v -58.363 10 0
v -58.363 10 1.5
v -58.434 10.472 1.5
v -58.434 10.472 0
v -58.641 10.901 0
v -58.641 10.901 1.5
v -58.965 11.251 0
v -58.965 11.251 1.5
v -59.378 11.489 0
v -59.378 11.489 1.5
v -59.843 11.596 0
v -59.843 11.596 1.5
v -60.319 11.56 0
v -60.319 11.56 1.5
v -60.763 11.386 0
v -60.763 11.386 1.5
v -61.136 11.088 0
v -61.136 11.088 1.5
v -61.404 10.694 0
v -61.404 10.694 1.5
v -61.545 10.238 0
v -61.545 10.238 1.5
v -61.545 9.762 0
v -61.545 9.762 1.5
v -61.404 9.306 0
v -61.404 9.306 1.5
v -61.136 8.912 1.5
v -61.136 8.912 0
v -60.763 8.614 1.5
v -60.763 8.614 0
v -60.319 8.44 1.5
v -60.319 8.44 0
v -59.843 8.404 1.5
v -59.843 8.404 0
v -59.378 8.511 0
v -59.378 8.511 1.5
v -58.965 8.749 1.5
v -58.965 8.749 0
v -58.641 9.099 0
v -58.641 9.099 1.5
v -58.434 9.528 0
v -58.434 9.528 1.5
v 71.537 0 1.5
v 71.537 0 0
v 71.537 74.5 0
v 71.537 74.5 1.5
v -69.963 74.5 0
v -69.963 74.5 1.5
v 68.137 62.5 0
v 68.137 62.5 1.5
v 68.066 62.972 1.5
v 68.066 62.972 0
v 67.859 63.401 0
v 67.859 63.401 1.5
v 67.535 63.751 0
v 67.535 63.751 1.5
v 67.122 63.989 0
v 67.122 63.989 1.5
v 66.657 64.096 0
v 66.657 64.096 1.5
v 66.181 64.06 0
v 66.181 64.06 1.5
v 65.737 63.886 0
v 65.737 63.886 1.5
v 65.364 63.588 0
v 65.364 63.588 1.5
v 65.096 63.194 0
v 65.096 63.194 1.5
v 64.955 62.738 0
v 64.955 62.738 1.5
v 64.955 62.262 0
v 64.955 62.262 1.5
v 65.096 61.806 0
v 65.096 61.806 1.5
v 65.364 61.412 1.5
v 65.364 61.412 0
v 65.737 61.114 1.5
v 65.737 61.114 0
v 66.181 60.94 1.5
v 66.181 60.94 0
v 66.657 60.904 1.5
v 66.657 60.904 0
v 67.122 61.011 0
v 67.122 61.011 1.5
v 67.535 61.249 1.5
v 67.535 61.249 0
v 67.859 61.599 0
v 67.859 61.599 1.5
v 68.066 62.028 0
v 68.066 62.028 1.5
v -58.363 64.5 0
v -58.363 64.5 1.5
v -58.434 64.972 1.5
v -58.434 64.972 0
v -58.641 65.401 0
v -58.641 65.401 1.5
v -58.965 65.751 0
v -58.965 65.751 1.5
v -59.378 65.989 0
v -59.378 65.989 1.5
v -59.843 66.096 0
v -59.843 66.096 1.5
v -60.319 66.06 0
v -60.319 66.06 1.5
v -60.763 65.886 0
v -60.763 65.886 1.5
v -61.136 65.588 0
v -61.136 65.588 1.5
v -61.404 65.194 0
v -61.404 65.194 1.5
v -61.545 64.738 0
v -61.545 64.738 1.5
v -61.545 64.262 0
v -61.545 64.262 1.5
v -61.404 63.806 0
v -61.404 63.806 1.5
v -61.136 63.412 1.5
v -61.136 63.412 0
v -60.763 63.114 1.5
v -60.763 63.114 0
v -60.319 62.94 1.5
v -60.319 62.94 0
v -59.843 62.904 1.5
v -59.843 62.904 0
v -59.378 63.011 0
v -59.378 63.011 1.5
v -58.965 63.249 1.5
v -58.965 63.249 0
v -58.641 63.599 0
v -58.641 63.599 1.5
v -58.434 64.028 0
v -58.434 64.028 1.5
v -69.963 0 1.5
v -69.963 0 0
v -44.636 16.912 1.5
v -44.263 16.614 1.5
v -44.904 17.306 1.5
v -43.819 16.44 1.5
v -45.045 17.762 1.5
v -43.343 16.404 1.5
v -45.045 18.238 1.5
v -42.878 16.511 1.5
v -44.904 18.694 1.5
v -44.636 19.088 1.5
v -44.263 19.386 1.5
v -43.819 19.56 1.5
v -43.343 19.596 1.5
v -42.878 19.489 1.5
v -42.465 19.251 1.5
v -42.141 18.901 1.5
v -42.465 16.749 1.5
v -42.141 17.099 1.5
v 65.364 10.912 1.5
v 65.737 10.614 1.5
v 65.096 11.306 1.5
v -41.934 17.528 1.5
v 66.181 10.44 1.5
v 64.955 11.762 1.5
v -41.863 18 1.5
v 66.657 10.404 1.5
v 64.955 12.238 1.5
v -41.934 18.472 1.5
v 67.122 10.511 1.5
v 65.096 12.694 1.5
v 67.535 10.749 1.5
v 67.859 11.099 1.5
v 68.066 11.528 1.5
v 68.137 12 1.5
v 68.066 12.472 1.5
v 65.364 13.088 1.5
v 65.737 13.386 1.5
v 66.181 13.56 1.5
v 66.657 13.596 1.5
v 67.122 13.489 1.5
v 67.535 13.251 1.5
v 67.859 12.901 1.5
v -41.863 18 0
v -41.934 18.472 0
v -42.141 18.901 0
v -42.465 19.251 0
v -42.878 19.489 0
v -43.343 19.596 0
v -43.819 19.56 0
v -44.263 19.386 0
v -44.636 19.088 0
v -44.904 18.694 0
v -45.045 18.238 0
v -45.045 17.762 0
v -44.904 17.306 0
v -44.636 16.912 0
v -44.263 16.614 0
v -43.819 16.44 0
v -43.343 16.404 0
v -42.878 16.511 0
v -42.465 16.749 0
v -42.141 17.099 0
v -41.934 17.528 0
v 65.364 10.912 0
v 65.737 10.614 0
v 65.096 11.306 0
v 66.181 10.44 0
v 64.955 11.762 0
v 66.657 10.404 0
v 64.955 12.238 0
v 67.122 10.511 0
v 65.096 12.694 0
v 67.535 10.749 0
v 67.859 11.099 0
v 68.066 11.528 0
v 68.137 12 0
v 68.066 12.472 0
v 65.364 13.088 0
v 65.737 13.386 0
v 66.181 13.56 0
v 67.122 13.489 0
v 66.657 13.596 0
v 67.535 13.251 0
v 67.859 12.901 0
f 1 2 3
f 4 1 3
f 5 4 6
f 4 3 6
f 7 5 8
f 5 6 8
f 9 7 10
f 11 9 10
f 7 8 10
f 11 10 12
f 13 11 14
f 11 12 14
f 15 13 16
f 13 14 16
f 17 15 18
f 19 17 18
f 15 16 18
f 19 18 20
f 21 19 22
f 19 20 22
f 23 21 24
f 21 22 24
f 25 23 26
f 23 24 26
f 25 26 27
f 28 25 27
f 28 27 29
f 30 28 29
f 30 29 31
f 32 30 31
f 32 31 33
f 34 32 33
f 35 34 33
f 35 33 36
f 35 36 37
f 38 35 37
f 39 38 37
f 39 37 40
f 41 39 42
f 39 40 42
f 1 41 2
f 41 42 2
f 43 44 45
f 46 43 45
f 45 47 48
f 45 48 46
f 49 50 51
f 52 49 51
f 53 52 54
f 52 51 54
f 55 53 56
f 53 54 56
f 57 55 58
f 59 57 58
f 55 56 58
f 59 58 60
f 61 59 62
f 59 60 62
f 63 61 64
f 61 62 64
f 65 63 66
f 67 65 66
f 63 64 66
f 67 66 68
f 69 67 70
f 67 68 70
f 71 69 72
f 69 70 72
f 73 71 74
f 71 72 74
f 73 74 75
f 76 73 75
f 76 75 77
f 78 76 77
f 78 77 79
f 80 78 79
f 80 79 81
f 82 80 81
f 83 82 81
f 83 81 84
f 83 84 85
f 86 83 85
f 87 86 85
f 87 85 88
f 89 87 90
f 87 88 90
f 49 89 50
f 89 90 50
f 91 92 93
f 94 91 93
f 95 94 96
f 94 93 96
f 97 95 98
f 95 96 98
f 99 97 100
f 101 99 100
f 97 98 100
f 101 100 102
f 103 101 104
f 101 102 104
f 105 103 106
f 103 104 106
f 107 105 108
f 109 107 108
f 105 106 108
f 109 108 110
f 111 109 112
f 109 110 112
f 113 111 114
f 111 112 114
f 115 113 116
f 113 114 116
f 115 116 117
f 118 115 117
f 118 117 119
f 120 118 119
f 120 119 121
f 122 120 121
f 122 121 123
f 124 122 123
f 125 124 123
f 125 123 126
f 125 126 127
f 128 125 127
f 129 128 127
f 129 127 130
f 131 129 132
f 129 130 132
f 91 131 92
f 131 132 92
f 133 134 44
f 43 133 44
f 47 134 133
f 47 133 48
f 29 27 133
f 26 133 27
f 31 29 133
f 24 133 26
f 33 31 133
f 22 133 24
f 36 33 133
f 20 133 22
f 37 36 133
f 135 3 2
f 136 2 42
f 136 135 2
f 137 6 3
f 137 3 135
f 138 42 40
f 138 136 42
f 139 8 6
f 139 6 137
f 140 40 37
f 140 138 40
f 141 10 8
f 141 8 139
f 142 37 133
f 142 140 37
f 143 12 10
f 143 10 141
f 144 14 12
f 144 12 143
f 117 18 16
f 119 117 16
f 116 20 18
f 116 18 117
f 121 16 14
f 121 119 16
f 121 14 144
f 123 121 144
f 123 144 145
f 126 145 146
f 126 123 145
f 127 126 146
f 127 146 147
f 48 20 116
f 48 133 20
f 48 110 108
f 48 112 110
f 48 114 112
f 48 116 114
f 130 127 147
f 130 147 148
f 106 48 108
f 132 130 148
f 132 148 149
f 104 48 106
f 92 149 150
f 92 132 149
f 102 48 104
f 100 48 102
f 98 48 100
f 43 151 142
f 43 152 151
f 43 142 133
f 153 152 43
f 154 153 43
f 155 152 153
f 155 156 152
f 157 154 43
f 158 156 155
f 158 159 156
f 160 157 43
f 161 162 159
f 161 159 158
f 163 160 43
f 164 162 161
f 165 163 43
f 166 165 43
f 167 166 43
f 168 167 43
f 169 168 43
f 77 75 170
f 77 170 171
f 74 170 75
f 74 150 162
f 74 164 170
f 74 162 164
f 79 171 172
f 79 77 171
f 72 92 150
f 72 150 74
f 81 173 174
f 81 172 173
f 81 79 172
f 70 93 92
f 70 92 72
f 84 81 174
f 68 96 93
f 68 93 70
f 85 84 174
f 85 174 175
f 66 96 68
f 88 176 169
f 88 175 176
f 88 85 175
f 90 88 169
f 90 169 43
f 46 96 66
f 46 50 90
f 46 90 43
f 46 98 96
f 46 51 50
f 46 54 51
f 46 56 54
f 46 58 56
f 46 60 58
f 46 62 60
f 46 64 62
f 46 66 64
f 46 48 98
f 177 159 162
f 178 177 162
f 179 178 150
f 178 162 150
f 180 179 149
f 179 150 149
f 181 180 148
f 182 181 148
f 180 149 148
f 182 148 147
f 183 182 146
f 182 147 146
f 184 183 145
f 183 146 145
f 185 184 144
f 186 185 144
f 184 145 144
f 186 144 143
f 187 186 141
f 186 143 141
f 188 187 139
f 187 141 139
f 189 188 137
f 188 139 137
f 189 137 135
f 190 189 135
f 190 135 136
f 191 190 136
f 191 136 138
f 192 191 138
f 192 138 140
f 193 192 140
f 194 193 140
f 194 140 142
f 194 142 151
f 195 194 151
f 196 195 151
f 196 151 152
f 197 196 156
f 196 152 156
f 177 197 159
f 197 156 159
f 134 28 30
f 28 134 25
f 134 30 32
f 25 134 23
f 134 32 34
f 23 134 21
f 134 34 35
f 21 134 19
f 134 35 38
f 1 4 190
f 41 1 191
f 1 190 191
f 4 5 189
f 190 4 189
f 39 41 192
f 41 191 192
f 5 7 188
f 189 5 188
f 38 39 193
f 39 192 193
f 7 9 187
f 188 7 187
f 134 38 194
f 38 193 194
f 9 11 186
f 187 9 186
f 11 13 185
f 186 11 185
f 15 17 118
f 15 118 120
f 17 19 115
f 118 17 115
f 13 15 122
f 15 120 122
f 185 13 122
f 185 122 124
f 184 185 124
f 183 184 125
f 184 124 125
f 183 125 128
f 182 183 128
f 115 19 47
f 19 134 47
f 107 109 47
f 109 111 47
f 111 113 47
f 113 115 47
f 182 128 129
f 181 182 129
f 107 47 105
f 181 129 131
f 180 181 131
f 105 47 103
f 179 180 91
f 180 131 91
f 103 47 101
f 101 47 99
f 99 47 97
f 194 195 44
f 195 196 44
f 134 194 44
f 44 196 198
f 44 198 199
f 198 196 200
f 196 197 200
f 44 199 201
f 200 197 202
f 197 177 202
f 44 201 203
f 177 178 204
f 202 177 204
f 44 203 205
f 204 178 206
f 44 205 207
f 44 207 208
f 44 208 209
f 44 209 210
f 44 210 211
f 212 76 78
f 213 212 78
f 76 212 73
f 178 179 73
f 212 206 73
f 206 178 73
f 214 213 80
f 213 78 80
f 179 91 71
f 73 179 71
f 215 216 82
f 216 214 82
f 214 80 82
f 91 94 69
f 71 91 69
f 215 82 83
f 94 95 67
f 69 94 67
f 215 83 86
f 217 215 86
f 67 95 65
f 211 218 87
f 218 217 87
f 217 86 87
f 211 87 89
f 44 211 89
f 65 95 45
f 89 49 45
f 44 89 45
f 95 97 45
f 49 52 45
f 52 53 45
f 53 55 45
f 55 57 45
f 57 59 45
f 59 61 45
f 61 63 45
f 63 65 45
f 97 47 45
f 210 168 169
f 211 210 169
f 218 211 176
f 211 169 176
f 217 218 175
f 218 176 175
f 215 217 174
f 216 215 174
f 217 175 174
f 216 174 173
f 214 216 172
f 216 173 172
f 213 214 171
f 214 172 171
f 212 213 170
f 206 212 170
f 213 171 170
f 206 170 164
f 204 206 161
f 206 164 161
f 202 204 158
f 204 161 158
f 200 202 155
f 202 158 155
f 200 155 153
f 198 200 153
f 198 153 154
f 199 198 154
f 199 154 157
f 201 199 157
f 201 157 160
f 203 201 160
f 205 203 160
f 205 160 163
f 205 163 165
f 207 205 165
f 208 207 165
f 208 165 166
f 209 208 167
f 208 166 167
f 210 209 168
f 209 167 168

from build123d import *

# Parameters (mm, degrees)
SKETCH1_W           = 141.5
SKETCH1_H           = 74.5
BOSS_EXTRUDE1_DEPTH = 1.5
SKETCH2_R           = 1.6
CUT_EXTRUDE1_DEPTH  = 1.5
SKETCH3_R           = 1.6
CUT_EXTRUDE2_DEPTH  = 1.5
SKETCH4_R           = 1.6
CUT_EXTRUDE3_DEPTH  = 1.5


with BuildPart() as part:
    # Sketch1 → Boss-Extrude1 (new body)
    with BuildSketch(Plane.XY):
        with Locations((0.787232686, 37.25)):
            Rectangle(SKETCH1_W, SKETCH1_H)
    extrude(amount=BOSS_EXTRUDE1_DEPTH)

    # Sketch2 → Cut-Extrude1 (cut)
    with BuildSketch(Plane.XY.offset(1.5)):
        with Locations((-59.962767314, 64.5)):
            Circle(SKETCH2_R)
        with Locations((-59.962767314, 10)):
            Circle(SKETCH2_R)
    extrude(amount=-CUT_EXTRUDE1_DEPTH, mode=Mode.SUBTRACT)

    # Sketch3 → Cut-Extrude2 (cut)
    with BuildSketch(Plane.XY.offset(1.5)):
        with Locations((66.537232686, 62.5)):
            Circle(SKETCH3_R)
        with Locations((66.537232686, 12)):
            Circle(SKETCH3_R)
    extrude(amount=-CUT_EXTRUDE2_DEPTH, mode=Mode.SUBTRACT)

    # Sketch4 → Cut-Extrude3 (cut)
    with BuildSketch(Plane.XY.offset(1.5)):
        with Locations((-43.462767314, 18)):
            Circle(SKETCH4_R)
    extrude(amount=-CUT_EXTRUDE3_DEPTH, mode=Mode.SUBTRACT)


solid = part.part
